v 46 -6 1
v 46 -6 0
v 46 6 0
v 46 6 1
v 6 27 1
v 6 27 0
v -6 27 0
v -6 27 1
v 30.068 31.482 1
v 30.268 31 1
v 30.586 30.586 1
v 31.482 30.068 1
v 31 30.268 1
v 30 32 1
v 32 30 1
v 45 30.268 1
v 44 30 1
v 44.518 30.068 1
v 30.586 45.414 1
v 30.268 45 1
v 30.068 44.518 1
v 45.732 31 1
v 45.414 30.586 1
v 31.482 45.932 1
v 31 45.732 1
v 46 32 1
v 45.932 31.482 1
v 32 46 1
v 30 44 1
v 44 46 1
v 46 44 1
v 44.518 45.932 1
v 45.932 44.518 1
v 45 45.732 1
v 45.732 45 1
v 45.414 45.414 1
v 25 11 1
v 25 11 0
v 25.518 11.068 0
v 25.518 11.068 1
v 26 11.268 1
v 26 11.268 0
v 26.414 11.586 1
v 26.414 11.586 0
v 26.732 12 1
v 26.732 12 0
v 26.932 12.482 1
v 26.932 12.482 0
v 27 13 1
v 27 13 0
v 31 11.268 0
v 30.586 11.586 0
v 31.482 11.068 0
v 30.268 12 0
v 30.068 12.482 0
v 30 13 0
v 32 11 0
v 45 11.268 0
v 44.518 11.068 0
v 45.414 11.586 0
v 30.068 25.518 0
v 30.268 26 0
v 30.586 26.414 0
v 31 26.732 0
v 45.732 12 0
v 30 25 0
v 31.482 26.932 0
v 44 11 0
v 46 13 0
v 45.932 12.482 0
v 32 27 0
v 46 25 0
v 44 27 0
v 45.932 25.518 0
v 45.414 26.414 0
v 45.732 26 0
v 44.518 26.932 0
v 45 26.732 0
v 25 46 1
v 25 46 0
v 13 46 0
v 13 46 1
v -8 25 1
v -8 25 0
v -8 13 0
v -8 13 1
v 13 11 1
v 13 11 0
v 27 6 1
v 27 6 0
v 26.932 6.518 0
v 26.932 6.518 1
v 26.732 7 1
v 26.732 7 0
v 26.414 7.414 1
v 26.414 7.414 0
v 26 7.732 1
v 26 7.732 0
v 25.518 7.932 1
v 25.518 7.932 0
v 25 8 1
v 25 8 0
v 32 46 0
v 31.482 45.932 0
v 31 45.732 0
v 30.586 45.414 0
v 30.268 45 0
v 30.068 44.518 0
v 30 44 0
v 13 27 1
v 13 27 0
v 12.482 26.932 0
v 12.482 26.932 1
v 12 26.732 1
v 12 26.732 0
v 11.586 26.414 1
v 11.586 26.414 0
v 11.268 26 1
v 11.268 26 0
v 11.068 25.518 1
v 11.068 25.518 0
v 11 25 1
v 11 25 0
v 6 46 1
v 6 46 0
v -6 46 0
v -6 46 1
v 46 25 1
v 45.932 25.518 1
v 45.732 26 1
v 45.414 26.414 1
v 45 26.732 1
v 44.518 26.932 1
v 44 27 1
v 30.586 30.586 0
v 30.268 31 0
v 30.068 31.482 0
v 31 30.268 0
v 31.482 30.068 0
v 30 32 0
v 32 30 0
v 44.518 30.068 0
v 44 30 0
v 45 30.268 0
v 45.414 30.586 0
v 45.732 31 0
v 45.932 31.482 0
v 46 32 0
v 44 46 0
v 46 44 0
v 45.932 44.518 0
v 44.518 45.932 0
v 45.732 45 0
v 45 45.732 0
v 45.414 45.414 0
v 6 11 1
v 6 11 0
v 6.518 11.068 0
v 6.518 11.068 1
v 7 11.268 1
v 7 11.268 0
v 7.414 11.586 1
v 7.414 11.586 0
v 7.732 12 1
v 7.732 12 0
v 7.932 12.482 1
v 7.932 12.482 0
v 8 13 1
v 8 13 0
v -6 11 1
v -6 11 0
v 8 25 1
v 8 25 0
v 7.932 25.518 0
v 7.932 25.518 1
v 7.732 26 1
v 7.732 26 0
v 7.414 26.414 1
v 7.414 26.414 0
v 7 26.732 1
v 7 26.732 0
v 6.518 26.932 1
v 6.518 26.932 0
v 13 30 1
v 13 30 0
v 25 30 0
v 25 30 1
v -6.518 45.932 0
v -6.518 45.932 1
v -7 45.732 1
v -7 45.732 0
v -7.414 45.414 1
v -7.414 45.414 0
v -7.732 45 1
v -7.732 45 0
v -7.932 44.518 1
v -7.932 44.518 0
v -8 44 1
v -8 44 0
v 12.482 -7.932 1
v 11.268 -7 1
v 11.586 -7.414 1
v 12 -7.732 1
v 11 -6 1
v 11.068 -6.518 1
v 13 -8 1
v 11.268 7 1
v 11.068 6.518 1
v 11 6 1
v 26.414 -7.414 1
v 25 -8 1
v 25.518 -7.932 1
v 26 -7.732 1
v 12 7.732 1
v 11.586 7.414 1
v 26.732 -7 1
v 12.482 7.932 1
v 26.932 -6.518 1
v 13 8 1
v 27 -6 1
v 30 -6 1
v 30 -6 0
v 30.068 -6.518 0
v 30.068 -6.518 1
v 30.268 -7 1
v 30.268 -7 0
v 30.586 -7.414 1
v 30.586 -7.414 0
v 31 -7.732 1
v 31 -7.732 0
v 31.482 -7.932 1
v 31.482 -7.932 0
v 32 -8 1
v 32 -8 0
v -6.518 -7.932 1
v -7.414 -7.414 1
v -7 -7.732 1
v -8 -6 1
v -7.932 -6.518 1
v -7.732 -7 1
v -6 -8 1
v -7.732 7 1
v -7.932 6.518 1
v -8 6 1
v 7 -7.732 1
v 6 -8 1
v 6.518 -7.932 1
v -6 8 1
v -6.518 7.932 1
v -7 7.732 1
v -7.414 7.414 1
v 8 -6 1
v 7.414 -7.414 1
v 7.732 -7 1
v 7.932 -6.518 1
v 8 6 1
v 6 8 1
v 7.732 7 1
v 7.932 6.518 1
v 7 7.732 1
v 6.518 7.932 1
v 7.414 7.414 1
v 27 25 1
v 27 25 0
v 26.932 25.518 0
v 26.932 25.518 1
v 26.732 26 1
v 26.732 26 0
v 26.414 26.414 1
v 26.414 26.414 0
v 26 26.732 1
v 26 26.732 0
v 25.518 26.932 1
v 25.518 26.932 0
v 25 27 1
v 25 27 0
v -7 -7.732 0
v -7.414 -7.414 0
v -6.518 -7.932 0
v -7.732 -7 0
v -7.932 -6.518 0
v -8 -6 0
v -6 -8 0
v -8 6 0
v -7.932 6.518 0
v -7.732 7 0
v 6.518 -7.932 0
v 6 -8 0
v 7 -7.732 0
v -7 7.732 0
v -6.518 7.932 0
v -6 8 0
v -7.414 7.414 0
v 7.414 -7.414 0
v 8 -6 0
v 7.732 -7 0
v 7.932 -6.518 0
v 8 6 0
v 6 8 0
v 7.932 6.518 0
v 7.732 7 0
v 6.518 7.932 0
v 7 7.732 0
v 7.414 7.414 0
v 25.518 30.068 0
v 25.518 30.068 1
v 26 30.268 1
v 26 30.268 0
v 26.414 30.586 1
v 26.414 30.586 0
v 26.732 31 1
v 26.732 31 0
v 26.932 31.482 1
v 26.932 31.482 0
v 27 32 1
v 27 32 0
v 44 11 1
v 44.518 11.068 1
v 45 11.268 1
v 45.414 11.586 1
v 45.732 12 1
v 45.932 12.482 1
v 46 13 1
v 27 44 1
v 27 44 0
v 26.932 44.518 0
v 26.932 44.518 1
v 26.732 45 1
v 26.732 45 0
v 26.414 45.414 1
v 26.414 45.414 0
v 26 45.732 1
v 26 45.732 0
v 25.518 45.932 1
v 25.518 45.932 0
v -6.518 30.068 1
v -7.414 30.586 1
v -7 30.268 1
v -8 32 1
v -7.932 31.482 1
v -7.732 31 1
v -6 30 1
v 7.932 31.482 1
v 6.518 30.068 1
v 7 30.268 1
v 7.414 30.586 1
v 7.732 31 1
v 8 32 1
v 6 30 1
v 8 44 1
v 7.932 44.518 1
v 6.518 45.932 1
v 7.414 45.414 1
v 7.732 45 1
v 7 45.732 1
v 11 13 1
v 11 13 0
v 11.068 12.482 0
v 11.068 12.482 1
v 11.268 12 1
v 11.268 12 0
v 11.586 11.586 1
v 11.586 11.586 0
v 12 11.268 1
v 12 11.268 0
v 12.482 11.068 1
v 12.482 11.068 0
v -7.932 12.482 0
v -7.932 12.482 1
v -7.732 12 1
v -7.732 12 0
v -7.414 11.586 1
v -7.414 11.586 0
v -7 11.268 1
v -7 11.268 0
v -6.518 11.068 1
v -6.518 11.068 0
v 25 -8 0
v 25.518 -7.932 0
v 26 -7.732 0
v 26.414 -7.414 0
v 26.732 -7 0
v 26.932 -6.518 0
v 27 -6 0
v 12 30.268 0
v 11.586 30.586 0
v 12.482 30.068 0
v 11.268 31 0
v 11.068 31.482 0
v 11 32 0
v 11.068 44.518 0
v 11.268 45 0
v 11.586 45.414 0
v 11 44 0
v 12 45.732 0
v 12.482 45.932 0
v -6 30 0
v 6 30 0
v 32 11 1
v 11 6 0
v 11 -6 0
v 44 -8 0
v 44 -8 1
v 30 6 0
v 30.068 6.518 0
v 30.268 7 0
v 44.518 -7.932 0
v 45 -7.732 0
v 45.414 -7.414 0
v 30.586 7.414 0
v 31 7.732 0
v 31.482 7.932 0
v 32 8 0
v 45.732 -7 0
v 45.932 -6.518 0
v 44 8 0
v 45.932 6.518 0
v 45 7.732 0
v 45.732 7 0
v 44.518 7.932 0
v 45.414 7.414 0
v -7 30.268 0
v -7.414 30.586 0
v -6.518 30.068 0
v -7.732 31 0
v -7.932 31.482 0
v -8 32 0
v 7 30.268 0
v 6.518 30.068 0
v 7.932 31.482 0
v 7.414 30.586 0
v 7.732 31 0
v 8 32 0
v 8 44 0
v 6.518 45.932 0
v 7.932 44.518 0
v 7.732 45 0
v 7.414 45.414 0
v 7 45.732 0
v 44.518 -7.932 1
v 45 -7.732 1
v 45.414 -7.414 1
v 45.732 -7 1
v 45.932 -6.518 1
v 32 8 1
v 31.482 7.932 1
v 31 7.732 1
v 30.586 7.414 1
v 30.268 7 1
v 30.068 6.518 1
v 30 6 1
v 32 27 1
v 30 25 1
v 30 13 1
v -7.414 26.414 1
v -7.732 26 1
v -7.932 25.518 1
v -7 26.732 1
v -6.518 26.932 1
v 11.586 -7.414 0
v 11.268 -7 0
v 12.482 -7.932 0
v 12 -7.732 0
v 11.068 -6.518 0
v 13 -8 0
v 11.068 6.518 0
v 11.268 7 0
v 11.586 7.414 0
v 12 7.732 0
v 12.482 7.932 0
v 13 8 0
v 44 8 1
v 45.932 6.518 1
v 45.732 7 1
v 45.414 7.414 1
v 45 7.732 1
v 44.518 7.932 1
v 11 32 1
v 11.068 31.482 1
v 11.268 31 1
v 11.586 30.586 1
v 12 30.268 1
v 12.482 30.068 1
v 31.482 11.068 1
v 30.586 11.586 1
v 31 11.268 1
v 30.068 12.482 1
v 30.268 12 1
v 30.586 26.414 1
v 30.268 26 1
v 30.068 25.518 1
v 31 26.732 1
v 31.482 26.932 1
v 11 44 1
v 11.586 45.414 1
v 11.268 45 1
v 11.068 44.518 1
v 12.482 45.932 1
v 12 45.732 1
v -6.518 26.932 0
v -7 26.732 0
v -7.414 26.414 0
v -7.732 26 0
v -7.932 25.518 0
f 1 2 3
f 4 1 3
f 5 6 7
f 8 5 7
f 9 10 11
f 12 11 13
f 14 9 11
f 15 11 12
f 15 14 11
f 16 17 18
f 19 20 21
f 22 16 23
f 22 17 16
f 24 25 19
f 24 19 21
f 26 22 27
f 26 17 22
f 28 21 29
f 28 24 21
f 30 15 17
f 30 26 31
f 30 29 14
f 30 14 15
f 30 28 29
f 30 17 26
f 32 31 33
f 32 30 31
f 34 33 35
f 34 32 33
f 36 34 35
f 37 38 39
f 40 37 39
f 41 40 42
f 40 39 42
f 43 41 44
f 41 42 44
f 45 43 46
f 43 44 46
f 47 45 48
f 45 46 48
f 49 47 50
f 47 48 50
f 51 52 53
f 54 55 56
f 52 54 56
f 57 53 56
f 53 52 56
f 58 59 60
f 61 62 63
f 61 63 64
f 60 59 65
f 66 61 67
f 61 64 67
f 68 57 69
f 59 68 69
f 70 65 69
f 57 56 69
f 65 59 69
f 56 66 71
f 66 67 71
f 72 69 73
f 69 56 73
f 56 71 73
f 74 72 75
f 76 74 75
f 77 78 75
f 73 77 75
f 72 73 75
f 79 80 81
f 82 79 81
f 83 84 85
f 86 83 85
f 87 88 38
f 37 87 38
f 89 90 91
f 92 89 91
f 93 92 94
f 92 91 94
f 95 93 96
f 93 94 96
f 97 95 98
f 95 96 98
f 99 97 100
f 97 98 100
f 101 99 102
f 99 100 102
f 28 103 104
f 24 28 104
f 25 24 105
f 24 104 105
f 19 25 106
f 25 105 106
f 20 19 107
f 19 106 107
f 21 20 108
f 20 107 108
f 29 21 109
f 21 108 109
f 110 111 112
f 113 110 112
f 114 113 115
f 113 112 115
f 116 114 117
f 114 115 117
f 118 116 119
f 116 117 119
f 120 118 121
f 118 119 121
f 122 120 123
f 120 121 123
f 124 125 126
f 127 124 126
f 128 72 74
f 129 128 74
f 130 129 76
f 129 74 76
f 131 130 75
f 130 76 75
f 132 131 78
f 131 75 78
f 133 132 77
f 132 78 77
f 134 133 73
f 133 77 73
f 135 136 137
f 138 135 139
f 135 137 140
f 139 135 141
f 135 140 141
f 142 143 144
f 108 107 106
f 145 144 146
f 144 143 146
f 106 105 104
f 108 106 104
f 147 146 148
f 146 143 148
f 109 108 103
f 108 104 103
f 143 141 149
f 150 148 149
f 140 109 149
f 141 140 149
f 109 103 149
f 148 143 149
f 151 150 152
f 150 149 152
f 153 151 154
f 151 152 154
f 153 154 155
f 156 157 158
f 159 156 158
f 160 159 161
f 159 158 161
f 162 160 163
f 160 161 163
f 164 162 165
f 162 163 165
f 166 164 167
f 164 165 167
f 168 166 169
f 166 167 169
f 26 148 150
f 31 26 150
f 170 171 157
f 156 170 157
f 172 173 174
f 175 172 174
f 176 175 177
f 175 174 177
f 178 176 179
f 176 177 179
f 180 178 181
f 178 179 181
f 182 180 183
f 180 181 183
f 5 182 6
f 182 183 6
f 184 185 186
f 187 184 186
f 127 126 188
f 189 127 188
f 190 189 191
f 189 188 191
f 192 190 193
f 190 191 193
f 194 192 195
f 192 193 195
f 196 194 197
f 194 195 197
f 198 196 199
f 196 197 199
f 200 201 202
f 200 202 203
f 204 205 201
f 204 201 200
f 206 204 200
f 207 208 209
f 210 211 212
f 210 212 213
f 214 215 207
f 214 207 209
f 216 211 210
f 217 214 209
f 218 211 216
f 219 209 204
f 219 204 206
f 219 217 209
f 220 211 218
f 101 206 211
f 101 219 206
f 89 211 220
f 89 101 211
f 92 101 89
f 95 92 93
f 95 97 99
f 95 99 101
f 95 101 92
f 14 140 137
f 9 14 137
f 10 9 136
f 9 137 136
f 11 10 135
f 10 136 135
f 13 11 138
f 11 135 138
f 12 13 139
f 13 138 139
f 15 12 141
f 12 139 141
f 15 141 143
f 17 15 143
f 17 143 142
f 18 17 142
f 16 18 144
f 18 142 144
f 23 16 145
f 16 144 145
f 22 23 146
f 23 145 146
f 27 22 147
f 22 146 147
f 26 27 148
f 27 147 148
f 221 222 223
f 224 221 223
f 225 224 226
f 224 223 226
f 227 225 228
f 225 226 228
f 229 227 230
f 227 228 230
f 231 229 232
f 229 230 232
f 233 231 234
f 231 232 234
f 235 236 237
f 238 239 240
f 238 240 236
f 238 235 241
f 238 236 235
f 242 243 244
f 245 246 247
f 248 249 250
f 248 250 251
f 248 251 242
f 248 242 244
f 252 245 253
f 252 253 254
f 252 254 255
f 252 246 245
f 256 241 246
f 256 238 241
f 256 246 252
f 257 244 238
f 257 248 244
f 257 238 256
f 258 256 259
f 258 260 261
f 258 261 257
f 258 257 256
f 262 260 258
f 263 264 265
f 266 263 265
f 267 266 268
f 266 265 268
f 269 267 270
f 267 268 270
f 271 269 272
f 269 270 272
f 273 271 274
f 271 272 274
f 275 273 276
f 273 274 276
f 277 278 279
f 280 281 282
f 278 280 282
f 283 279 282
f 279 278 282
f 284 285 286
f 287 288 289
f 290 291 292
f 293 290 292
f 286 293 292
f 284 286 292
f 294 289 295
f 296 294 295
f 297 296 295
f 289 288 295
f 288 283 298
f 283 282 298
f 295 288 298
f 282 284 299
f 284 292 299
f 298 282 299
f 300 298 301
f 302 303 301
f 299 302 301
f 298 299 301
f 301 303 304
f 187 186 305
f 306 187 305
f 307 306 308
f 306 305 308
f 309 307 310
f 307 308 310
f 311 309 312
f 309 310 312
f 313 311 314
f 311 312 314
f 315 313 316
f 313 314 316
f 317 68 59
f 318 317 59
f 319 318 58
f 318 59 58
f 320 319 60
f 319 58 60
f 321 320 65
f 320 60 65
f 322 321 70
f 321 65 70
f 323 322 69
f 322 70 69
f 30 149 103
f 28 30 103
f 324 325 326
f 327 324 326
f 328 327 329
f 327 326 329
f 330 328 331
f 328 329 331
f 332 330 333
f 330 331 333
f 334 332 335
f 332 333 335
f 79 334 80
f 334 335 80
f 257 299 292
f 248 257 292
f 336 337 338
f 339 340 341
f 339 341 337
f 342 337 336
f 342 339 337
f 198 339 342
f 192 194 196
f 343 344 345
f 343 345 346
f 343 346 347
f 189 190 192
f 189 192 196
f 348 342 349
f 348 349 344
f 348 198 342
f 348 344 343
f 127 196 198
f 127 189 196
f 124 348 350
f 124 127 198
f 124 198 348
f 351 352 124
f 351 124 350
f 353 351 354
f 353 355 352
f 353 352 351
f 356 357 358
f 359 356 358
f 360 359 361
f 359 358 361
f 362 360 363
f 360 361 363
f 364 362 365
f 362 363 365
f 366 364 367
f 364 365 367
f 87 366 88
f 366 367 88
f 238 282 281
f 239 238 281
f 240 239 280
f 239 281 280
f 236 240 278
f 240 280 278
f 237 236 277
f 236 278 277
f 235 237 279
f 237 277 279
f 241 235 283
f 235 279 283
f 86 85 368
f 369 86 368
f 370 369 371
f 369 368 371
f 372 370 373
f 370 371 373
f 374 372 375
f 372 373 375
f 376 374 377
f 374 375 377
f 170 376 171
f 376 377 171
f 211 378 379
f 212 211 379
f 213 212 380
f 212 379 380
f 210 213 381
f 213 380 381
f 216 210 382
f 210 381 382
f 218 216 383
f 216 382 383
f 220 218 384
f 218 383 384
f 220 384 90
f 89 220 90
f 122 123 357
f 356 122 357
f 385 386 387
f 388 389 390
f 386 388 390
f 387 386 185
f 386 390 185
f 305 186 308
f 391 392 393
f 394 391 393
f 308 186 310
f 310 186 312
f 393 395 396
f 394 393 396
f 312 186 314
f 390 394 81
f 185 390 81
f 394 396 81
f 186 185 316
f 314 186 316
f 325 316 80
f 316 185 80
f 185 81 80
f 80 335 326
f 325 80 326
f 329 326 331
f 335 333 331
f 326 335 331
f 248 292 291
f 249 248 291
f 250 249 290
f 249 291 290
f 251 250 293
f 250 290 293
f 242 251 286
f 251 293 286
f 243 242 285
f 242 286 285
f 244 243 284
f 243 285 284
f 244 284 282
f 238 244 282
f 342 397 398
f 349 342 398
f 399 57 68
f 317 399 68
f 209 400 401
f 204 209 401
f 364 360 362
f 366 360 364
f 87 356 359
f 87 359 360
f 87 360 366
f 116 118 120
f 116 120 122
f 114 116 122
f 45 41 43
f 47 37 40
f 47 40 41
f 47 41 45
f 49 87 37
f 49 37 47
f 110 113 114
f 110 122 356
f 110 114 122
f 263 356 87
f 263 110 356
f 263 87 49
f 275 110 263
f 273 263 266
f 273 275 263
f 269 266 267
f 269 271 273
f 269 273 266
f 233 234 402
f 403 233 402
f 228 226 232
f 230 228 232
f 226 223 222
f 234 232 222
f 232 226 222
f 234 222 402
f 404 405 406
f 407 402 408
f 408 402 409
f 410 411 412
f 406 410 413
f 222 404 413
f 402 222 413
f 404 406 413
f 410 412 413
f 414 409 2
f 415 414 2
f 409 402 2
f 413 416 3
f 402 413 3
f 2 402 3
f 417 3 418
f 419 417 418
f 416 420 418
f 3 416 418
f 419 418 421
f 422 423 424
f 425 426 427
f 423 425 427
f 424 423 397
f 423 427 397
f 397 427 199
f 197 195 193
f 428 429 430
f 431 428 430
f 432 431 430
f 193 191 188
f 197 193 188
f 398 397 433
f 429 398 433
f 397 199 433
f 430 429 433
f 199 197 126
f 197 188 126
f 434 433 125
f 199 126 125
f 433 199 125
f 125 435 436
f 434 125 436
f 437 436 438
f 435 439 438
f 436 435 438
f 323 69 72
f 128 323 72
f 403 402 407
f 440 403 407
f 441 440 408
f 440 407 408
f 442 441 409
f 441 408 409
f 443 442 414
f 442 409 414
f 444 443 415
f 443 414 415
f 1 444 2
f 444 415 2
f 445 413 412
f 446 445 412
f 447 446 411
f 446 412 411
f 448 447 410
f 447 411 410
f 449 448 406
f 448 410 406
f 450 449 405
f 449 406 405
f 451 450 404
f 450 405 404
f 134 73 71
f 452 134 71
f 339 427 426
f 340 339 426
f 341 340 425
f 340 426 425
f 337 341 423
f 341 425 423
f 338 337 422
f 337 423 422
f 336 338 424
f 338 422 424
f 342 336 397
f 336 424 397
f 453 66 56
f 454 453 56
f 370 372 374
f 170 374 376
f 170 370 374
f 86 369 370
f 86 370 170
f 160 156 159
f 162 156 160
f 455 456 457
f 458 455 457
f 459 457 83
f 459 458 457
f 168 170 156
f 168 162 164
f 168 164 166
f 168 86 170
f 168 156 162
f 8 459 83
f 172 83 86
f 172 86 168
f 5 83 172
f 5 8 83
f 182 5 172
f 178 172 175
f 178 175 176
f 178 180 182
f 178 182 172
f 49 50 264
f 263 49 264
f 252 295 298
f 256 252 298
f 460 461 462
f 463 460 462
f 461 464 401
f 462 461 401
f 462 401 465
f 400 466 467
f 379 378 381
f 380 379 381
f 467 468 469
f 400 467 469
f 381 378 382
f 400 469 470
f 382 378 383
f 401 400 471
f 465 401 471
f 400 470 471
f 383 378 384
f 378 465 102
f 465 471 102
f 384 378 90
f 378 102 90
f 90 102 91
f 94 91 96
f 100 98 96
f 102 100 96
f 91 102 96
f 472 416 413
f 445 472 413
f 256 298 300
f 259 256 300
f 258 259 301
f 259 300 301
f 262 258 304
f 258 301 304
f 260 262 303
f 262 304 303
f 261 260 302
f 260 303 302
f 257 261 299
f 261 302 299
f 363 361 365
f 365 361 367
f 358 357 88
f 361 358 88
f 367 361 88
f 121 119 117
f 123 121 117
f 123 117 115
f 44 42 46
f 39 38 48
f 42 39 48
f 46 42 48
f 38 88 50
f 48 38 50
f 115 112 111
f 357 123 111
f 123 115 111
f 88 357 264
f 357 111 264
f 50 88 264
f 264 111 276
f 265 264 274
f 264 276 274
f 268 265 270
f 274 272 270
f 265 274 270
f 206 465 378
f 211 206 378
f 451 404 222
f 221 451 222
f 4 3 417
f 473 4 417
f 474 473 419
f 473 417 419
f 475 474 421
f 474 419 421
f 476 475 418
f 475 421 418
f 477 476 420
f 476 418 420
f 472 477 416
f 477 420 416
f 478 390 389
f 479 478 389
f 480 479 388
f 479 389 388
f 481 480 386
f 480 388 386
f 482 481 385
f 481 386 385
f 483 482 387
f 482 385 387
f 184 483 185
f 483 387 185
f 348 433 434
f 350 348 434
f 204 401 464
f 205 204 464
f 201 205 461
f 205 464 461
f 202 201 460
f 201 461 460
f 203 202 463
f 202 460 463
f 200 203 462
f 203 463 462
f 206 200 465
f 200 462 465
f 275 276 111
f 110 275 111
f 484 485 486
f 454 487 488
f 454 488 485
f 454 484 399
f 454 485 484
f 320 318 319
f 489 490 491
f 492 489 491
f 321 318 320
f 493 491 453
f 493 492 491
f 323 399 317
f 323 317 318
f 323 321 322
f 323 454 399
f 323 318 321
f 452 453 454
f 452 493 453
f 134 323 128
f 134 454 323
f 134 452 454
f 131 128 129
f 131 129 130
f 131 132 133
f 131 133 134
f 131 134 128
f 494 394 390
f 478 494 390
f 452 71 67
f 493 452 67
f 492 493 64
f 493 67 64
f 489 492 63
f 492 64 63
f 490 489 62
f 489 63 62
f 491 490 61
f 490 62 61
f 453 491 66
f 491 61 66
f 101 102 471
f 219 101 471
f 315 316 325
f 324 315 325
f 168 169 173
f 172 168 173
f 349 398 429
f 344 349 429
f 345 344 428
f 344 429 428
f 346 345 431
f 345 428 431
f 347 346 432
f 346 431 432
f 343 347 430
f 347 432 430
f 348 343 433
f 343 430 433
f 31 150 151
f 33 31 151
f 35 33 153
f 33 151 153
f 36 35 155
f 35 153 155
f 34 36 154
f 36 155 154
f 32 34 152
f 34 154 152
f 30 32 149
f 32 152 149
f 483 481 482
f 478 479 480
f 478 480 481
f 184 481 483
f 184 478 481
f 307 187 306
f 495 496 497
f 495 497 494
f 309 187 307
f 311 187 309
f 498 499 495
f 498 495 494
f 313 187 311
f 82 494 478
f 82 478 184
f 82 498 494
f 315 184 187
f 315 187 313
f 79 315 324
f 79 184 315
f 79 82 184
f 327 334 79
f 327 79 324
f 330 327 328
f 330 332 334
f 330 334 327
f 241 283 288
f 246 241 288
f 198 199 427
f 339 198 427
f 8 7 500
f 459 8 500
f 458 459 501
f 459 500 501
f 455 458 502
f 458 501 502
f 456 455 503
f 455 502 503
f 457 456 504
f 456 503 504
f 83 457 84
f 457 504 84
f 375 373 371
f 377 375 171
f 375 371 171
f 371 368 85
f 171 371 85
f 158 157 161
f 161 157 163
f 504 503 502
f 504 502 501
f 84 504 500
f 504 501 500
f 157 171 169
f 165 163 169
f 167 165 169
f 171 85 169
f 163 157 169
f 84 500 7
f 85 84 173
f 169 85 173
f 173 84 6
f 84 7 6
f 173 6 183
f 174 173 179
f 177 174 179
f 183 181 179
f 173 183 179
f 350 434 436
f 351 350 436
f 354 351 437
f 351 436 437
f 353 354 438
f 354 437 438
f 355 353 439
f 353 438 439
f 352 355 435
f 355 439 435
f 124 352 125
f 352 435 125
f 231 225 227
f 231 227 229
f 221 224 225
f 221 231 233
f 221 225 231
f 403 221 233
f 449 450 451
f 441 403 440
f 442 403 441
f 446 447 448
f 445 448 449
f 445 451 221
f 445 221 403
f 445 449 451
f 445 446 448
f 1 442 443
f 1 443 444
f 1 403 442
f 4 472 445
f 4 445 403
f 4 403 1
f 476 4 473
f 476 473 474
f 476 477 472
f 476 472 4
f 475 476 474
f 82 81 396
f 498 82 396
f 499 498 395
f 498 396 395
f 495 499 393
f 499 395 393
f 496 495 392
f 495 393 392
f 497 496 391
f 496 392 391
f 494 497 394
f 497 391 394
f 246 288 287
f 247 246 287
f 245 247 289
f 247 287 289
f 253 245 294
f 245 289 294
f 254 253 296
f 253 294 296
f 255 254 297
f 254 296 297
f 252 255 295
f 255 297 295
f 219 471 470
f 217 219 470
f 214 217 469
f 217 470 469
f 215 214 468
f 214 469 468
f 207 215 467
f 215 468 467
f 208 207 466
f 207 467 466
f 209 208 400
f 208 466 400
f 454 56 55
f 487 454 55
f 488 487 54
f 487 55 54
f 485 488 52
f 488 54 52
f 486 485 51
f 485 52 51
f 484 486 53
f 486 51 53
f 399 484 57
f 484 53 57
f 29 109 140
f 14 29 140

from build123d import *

# Parameters (mm, degrees)
F1_DEPTH = 1


with BuildPart() as f1:
    # F0 (on Top) → F1 (new body)
    with BuildSketch(Plane.XY):
        with BuildLine():
            ThreePointArc((8, 6), (7.414214, 7.414214), (6, 8))
            Line((6, 8), (-6, 8))
            ThreePointArc((-6, 8), (-7.414214, 7.414214), (-8, 6))
            Line((-8, 6), (-8, -6))
            ThreePointArc((-8, -6), (-7.414214, -7.414214), (-6, -8))
            Line((-6, -8), (6, -8))
            ThreePointArc((6, -8), (7.414214, -7.414214), (8, -6))
            Line((8, -6), (8, 6))
        make_face()
        with BuildLine():
            Line((-6, 11), (6, 11))
            ThreePointArc((6, 11), (7.414214, 11.585786), (8, 13))
            Line((8, 13), (8, 25))
            ThreePointArc((8, 25), (7.414214, 26.414214), (6, 27))
            Line((6, 27), (-6, 27))
            ThreePointArc((-6, 27), (-7.414214, 26.414214), (-8, 25))
            Line((-8, 25), (-8, 13))
            ThreePointArc((-8, 13), (-7.414214, 11.585786), (-6, 11))
        make_face()
        with BuildLine():
            Line((-6, 30), (6, 30))
            ThreePointArc((6, 30), (7.414214, 30.585786), (8, 32))
            Line((8, 32), (8, 44))
            ThreePointArc((8, 44), (7.414214, 45.414214), (6, 46))
            Line((6, 46), (-6, 46))
            ThreePointArc((-6, 46), (-7.414214, 45.414214), (-8, 44))
            Line((-8, 44), (-8, 32))
            ThreePointArc((-8, 32), (-7.414214, 30.585786), (-6, 30))
        make_face()
        with BuildLine():
            Line((13, -8), (25, -8))
            ThreePointArc((25, -8), (26.414214, -7.414214), (27, -6))
            Line((27, -6), (27, 6))
            ThreePointArc((27, 6), (26.414214, 7.414214), (25, 8))
            Line((25, 8), (13, 8))
            ThreePointArc((13, 8), (11.585786, 7.414214), (11, 6))
            Line((11, 6), (11, -6))
            ThreePointArc((11, -6), (11.585786, -7.414214), (13, -8))
        make_face()
        with BuildLine():
            Line((13, 11), (25, 11))
            ThreePointArc((25, 11), (26.414214, 11.585786), (27, 13))
            Line((27, 13), (27, 25))
            ThreePointArc((27, 25), (26.414214, 26.414214), (25, 27))
            Line((25, 27), (13, 27))
            ThreePointArc((13, 27), (11.585786, 26.414214), (11, 25))
            Line((11, 25), (11, 13))
            ThreePointArc((11, 13), (11.585786, 11.585786), (13, 11))
        make_face()
        with BuildLine():
            Line((13, 30), (25, 30))
            ThreePointArc((25, 30), (26.414214, 30.585786), (27, 32))
            Line((27, 32), (27, 44))
            ThreePointArc((27, 44), (26.414214, 45.414214), (25, 46))
            Line((25, 46), (13, 46))
            ThreePointArc((13, 46), (11.585786, 45.414214), (11, 44))
            Line((11, 44), (11, 32))
            ThreePointArc((11, 32), (11.585786, 30.585786), (13, 30))
        make_face()
        with BuildLine():
            Line((32, -8), (44, -8))
            ThreePointArc((44, -8), (45.414214, -7.414214), (46, -6))
            Line((46, -6), (46, 6))
            ThreePointArc((46, 6), (45.414214, 7.414214), (44, 8))
            Line((44, 8), (32, 8))
            ThreePointArc((32, 8), (30.585786, 7.414214), (30, 6))
            Line((30, 6), (30, -6))
            ThreePointArc((30, -6), (30.585786, -7.414214), (32, -8))
        make_face()
        with BuildLine():
            Line((32, 11), (44, 11))
            ThreePointArc((44, 11), (45.414214, 11.585786), (46, 13))
            Line((46, 13), (46, 25))
            ThreePointArc((46, 25), (45.414214, 26.414214), (44, 27))
            Line((44, 27), (32, 27))
            ThreePointArc((32, 27), (30.585786, 26.414214), (30, 25))
            Line((30, 25), (30, 13))
            ThreePointArc((30, 13), (30.585786, 11.585786), (32, 11))
        make_face()
        with BuildLine():
            Line((32, 30), (44, 30))
            ThreePointArc((44, 30), (45.414214, 30.585786), (46, 32))
            Line((46, 32), (46, 44))
            ThreePointArc((46, 44), (45.414214, 45.414214), (44, 46))
            Line((44, 46), (32, 46))
            ThreePointArc((32, 46), (30.585786, 45.414214), (30, 44))
            Line((30, 44), (30, 32))
            ThreePointArc((30, 32), (30.585786, 30.585786), (32, 30))
        make_face()
    extrude(amount=F1_DEPTH)


solid = f1.part
